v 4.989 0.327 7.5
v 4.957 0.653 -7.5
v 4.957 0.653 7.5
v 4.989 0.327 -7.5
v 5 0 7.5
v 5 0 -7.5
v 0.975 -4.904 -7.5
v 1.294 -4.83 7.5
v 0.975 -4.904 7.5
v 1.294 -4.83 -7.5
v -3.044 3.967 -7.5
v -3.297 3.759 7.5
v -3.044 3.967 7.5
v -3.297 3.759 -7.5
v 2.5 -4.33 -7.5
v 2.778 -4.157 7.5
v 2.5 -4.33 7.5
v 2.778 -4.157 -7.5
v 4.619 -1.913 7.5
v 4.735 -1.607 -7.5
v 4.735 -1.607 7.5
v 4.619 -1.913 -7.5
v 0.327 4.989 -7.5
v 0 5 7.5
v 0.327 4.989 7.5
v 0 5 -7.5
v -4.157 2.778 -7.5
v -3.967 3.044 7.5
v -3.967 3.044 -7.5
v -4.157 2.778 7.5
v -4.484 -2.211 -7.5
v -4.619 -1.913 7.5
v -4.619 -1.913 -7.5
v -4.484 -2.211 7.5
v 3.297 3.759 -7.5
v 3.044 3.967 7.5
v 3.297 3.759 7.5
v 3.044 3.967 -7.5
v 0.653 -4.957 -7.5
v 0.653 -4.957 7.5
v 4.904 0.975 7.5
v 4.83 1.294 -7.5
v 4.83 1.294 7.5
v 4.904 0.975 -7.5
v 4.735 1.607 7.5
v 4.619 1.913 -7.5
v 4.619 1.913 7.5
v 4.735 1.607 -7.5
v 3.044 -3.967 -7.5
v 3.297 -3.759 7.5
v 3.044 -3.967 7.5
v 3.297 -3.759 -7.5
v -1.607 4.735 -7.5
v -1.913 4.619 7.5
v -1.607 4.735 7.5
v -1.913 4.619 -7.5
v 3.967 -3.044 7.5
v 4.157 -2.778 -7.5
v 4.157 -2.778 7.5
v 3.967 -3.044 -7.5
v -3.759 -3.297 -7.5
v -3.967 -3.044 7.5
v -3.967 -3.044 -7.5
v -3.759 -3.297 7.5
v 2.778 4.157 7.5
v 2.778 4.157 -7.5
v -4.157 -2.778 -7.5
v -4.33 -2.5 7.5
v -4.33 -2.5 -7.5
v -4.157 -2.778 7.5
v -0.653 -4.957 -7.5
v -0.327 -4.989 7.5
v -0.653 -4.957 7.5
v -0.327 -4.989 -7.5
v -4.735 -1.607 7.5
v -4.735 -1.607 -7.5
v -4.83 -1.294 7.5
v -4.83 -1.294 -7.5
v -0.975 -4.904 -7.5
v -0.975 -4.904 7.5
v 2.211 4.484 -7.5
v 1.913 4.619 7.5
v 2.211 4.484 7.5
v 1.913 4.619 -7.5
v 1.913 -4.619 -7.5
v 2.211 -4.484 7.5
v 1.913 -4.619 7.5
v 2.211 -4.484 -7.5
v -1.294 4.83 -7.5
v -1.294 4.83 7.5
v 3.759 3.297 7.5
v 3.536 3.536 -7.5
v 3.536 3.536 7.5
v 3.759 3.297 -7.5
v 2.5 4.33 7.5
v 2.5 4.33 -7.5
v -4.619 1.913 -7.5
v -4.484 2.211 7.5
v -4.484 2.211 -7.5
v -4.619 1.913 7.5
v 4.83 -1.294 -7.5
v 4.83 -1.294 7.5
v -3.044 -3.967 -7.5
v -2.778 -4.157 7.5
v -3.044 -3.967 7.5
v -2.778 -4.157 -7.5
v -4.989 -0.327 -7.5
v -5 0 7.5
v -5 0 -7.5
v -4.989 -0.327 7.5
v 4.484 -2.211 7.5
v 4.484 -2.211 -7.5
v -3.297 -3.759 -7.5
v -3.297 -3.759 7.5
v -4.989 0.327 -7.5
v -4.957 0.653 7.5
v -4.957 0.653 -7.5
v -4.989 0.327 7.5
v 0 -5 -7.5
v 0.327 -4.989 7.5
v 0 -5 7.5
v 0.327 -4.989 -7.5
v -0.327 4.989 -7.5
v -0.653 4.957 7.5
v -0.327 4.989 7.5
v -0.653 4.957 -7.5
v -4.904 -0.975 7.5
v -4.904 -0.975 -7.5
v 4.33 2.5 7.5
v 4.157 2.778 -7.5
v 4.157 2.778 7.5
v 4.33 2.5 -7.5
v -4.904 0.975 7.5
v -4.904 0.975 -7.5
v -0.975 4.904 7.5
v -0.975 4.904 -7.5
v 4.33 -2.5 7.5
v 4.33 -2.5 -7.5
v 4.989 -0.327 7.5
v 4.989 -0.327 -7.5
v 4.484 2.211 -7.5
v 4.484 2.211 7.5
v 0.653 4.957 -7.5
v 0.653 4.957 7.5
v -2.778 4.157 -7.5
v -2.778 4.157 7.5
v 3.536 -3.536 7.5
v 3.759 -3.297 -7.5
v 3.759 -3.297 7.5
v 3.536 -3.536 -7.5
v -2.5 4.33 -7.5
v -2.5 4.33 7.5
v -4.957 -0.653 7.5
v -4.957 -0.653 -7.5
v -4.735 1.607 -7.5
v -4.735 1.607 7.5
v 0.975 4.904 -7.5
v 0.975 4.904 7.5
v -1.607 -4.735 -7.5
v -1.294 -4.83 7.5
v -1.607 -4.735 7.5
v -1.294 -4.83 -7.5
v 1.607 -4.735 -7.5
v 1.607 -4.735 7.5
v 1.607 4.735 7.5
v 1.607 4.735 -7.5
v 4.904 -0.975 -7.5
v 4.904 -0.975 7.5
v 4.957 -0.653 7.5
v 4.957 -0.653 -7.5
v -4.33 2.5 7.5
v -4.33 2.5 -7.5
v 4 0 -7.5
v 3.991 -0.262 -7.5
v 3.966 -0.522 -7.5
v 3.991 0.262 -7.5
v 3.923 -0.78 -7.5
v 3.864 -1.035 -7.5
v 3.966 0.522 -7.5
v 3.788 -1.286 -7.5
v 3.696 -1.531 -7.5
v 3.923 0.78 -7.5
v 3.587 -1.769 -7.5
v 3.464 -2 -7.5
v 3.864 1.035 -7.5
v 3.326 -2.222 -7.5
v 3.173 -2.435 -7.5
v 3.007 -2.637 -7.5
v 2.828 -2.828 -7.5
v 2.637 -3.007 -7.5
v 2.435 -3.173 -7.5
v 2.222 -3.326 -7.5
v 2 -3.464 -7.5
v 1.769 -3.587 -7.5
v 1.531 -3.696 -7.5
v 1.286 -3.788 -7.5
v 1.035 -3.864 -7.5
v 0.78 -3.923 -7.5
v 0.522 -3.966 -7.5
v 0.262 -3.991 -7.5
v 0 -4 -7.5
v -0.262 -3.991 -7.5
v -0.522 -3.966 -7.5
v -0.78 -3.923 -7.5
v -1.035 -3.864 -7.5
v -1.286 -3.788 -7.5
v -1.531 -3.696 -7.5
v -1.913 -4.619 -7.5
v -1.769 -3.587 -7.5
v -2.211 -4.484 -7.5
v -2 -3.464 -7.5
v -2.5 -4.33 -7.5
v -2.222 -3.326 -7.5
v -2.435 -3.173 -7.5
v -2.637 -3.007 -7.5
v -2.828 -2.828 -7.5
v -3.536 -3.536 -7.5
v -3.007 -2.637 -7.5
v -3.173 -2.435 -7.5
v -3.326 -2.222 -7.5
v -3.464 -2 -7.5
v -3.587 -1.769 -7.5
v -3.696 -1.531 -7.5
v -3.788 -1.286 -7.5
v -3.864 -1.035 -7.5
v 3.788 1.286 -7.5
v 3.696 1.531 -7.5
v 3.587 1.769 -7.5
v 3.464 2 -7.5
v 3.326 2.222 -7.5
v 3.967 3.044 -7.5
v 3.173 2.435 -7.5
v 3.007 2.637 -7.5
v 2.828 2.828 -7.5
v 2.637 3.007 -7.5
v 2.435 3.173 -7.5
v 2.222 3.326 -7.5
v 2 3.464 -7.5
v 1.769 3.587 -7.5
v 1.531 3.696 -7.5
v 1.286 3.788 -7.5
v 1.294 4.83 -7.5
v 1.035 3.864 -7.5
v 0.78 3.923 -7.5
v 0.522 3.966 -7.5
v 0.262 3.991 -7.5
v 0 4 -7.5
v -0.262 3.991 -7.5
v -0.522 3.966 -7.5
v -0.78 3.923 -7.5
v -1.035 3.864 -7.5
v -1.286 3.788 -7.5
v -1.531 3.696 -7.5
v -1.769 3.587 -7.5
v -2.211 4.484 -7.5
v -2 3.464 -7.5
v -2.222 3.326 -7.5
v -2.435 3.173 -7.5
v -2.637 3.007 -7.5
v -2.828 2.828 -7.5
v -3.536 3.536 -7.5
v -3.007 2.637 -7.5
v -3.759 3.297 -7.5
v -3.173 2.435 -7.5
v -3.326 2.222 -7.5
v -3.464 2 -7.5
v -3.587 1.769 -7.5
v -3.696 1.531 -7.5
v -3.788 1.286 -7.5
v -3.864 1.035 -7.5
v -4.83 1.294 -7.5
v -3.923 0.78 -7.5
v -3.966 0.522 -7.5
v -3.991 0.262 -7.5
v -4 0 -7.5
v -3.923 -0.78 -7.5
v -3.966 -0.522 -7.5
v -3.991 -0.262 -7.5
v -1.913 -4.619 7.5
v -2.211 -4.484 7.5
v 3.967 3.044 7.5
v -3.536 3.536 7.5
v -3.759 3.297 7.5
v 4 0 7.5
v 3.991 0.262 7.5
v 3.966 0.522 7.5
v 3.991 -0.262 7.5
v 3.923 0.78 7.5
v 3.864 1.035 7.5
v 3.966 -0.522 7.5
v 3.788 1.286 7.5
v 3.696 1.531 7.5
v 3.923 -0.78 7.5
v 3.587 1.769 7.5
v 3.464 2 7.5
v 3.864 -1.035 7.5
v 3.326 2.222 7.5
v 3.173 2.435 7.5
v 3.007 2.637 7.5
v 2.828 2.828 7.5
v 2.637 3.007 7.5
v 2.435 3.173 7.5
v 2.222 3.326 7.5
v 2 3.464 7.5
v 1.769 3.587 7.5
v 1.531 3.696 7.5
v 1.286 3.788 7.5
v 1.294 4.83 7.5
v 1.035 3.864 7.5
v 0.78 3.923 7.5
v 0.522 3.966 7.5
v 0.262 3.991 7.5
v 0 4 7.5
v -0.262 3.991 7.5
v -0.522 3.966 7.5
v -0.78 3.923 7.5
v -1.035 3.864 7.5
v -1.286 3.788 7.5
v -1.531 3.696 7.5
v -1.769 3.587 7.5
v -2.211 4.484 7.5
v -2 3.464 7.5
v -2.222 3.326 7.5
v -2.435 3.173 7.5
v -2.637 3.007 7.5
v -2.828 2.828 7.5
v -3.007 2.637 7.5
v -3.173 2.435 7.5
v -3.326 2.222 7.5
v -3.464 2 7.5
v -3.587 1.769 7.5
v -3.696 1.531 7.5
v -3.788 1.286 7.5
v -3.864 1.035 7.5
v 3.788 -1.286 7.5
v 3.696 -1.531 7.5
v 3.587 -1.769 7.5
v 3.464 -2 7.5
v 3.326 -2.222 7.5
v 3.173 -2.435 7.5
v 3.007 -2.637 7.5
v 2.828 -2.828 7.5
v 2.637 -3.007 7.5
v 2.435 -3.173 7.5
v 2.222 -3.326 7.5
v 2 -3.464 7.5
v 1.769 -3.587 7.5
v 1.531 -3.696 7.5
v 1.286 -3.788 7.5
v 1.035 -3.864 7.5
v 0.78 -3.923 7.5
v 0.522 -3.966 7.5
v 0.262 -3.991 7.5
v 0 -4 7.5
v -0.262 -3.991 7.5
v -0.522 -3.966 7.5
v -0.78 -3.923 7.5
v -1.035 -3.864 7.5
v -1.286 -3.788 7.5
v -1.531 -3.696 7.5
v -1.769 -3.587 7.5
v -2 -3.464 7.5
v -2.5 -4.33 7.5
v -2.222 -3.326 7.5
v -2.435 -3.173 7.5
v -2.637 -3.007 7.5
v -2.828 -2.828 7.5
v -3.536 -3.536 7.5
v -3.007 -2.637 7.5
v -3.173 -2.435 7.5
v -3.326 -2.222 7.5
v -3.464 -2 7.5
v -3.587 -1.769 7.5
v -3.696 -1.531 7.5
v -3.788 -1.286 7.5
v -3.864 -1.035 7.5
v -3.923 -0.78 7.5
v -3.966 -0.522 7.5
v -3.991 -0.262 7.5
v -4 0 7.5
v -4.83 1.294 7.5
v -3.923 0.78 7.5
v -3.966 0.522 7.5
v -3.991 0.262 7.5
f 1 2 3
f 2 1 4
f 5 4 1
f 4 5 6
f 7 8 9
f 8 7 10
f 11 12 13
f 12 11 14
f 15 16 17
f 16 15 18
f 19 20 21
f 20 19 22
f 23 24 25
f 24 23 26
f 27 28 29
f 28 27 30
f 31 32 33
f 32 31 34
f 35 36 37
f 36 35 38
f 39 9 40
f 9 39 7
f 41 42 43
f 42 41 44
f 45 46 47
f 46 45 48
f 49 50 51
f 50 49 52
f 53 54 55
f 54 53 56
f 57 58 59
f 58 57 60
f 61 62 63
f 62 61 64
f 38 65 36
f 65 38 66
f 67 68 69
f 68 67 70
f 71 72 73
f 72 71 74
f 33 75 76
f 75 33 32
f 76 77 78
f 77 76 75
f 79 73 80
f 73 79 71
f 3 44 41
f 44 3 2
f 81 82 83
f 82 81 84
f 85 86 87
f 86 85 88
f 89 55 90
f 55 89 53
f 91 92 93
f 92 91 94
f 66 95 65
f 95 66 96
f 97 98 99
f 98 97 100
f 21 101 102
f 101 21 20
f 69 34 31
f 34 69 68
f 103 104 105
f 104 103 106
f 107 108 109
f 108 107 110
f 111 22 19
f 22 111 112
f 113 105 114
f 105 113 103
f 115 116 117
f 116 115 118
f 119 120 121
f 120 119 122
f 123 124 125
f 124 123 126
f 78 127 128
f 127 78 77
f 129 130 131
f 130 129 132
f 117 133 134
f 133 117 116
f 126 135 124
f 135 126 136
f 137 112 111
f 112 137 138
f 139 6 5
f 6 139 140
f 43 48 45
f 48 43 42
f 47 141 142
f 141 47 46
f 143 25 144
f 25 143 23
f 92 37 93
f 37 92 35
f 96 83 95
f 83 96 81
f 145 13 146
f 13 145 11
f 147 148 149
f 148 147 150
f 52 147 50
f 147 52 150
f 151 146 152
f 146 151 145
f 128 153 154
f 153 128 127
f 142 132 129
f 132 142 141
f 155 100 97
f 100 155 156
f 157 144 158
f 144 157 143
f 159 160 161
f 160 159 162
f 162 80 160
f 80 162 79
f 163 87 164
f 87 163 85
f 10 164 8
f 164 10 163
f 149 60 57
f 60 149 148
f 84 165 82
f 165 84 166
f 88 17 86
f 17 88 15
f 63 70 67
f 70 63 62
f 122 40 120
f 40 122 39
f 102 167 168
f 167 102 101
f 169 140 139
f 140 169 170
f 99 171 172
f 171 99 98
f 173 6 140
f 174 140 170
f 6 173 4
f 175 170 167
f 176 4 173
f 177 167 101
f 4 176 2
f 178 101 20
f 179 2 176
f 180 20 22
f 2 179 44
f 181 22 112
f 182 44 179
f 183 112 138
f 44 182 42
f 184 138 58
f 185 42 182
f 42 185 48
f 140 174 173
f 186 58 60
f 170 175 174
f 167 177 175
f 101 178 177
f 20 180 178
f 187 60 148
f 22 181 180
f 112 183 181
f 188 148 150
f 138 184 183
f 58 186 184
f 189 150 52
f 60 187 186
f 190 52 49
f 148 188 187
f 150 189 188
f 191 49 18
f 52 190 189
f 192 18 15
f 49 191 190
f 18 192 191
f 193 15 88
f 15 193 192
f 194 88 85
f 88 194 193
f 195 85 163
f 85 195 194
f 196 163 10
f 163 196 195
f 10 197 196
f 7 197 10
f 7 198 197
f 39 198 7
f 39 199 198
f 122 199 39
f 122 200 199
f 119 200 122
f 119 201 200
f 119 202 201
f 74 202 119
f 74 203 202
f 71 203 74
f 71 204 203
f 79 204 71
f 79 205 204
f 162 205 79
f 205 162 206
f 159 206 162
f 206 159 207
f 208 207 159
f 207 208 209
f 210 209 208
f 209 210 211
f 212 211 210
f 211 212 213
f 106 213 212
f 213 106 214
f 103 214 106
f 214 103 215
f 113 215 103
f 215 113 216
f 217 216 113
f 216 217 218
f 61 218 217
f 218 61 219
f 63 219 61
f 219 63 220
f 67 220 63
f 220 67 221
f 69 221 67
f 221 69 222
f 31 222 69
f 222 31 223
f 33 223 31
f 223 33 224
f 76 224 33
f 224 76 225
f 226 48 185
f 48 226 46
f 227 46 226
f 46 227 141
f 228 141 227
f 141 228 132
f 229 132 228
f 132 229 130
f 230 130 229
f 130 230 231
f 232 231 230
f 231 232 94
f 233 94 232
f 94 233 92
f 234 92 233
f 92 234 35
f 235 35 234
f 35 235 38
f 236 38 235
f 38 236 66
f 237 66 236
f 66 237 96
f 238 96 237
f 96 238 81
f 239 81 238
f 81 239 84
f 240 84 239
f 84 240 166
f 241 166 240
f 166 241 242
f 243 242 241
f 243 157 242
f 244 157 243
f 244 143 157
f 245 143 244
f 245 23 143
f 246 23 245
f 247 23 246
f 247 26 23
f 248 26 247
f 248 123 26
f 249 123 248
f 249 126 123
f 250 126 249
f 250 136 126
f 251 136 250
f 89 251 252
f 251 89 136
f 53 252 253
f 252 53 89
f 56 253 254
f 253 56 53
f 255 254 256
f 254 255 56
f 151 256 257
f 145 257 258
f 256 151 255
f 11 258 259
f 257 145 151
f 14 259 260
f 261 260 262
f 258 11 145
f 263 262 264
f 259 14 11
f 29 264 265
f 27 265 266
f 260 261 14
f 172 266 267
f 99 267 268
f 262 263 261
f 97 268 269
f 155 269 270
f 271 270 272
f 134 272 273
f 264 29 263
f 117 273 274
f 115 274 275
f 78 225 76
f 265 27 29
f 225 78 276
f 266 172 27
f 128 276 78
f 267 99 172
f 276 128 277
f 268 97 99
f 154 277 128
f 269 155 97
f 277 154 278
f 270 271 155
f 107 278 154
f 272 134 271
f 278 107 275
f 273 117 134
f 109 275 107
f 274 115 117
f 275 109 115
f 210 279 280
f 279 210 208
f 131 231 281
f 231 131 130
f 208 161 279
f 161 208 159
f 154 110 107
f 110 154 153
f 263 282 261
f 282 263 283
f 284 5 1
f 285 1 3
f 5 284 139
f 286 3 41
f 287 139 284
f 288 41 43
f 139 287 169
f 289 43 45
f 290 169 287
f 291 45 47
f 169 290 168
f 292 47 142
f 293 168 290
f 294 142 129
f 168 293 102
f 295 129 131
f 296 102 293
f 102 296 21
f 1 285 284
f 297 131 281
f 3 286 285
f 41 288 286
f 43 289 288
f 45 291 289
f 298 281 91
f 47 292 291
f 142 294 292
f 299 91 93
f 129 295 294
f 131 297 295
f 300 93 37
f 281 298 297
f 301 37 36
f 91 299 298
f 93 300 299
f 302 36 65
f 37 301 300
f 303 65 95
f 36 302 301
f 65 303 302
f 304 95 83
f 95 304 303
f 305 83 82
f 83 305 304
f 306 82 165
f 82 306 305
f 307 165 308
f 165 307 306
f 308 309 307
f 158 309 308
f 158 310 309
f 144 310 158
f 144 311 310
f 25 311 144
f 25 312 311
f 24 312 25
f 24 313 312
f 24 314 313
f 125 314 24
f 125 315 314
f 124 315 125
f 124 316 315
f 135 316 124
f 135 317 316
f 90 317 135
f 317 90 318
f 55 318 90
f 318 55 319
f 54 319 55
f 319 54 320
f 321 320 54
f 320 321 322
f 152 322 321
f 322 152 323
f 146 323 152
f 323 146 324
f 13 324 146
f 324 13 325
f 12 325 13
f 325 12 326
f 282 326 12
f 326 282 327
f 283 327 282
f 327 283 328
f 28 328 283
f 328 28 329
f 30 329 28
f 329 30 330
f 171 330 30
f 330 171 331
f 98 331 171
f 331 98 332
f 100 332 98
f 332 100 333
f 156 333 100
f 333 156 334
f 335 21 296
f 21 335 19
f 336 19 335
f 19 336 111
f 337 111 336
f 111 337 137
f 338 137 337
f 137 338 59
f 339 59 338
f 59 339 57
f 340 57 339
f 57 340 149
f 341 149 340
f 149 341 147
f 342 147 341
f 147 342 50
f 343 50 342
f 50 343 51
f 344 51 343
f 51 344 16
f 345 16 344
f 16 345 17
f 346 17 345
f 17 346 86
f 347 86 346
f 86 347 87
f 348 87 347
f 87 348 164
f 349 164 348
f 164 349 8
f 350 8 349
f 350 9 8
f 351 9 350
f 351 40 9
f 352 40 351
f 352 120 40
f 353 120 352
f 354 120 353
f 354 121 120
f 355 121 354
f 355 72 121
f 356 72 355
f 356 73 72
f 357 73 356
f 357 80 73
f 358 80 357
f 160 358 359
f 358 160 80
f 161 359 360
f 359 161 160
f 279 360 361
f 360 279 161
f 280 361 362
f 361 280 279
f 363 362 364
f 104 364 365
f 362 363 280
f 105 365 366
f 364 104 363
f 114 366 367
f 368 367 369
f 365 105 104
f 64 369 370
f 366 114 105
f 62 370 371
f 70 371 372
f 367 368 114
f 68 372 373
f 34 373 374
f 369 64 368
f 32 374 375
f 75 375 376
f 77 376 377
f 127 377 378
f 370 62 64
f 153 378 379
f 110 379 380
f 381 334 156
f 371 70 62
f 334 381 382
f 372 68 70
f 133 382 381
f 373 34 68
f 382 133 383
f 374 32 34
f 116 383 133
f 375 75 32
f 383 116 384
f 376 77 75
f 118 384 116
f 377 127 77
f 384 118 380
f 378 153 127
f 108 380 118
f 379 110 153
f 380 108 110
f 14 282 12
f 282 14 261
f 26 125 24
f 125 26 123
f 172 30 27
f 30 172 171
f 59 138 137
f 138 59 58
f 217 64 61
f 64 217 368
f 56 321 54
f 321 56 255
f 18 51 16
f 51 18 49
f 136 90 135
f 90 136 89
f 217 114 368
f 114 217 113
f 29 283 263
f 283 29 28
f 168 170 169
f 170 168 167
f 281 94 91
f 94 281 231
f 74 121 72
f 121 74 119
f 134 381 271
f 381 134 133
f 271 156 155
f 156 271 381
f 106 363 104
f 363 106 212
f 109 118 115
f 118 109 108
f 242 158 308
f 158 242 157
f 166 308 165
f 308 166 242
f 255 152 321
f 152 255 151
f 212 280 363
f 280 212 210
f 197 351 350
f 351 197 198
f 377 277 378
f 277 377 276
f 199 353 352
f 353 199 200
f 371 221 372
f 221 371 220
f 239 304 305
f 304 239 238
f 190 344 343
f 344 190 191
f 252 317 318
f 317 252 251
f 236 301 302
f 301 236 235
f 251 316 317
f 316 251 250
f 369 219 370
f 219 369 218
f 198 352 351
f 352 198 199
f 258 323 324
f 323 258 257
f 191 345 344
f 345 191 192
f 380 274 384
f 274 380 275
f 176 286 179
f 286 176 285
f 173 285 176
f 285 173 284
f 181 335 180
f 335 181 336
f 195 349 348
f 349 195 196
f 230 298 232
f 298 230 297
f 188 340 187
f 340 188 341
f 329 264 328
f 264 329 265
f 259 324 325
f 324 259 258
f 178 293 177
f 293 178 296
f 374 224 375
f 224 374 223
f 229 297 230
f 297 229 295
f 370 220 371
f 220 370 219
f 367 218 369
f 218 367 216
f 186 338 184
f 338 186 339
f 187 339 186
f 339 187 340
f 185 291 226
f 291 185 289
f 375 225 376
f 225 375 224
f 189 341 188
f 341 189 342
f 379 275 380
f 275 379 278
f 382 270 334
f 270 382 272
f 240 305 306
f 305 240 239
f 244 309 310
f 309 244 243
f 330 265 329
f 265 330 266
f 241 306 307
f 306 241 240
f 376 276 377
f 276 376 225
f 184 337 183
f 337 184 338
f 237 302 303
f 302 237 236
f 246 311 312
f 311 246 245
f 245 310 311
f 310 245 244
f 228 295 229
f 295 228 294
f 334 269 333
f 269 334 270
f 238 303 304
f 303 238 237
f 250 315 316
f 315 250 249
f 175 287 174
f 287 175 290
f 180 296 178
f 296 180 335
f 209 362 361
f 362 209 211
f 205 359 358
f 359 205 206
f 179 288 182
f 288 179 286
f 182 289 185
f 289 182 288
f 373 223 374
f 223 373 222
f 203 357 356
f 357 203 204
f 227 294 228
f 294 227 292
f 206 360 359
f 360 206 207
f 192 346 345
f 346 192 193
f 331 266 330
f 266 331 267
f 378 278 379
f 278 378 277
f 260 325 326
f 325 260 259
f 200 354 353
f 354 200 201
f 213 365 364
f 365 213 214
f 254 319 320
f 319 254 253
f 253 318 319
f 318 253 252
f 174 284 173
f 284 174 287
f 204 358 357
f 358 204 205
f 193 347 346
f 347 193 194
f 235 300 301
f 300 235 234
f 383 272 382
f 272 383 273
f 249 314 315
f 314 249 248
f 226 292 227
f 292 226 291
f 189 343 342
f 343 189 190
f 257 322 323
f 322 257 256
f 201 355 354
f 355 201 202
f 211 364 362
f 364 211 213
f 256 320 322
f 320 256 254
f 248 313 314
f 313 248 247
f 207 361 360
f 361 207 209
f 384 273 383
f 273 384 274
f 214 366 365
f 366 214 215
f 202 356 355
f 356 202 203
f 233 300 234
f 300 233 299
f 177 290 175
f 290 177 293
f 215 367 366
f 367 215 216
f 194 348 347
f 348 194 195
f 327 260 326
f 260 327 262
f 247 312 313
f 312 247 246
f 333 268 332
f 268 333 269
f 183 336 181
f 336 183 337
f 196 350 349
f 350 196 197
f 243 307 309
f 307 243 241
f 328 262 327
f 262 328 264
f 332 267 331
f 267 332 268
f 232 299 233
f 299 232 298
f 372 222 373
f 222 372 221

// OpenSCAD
// Parameters
length = 15; //[8:30:1]
outer_diameter = 10; //[5:20:0.5]
inner_diameter = 8; //[4:18:0.5]
forced_id = 0; //[0:18:0.5]
center = 1; //[0:1:1]
overlap = 1; //[0.5:2:0.5]

$fn = 96;

// Tubing - single connected solid (hollow cylinder)
module tubing() {
  od = outer_diameter;
  id_req = (forced_id > 0) ? forced_id : inner_diameter;

  // Keep a minimum wall thickness and avoid degenerate/negative radii
  min_wall = 0.2;
  id_clamped = max(0.2, min(id_req, od - 2*min_wall));

  difference() {
    cylinder(h=length, r=od/2, center=true);
    cylinder(h=length + 2*overlap, r=id_clamped/2, center=true);
  }
}

// Assembly
module assembly() {
  zoff = (center > 0) ? 0 : (length/2);
  translate([0, 0, zoff]) tubing();
}

assembly();
